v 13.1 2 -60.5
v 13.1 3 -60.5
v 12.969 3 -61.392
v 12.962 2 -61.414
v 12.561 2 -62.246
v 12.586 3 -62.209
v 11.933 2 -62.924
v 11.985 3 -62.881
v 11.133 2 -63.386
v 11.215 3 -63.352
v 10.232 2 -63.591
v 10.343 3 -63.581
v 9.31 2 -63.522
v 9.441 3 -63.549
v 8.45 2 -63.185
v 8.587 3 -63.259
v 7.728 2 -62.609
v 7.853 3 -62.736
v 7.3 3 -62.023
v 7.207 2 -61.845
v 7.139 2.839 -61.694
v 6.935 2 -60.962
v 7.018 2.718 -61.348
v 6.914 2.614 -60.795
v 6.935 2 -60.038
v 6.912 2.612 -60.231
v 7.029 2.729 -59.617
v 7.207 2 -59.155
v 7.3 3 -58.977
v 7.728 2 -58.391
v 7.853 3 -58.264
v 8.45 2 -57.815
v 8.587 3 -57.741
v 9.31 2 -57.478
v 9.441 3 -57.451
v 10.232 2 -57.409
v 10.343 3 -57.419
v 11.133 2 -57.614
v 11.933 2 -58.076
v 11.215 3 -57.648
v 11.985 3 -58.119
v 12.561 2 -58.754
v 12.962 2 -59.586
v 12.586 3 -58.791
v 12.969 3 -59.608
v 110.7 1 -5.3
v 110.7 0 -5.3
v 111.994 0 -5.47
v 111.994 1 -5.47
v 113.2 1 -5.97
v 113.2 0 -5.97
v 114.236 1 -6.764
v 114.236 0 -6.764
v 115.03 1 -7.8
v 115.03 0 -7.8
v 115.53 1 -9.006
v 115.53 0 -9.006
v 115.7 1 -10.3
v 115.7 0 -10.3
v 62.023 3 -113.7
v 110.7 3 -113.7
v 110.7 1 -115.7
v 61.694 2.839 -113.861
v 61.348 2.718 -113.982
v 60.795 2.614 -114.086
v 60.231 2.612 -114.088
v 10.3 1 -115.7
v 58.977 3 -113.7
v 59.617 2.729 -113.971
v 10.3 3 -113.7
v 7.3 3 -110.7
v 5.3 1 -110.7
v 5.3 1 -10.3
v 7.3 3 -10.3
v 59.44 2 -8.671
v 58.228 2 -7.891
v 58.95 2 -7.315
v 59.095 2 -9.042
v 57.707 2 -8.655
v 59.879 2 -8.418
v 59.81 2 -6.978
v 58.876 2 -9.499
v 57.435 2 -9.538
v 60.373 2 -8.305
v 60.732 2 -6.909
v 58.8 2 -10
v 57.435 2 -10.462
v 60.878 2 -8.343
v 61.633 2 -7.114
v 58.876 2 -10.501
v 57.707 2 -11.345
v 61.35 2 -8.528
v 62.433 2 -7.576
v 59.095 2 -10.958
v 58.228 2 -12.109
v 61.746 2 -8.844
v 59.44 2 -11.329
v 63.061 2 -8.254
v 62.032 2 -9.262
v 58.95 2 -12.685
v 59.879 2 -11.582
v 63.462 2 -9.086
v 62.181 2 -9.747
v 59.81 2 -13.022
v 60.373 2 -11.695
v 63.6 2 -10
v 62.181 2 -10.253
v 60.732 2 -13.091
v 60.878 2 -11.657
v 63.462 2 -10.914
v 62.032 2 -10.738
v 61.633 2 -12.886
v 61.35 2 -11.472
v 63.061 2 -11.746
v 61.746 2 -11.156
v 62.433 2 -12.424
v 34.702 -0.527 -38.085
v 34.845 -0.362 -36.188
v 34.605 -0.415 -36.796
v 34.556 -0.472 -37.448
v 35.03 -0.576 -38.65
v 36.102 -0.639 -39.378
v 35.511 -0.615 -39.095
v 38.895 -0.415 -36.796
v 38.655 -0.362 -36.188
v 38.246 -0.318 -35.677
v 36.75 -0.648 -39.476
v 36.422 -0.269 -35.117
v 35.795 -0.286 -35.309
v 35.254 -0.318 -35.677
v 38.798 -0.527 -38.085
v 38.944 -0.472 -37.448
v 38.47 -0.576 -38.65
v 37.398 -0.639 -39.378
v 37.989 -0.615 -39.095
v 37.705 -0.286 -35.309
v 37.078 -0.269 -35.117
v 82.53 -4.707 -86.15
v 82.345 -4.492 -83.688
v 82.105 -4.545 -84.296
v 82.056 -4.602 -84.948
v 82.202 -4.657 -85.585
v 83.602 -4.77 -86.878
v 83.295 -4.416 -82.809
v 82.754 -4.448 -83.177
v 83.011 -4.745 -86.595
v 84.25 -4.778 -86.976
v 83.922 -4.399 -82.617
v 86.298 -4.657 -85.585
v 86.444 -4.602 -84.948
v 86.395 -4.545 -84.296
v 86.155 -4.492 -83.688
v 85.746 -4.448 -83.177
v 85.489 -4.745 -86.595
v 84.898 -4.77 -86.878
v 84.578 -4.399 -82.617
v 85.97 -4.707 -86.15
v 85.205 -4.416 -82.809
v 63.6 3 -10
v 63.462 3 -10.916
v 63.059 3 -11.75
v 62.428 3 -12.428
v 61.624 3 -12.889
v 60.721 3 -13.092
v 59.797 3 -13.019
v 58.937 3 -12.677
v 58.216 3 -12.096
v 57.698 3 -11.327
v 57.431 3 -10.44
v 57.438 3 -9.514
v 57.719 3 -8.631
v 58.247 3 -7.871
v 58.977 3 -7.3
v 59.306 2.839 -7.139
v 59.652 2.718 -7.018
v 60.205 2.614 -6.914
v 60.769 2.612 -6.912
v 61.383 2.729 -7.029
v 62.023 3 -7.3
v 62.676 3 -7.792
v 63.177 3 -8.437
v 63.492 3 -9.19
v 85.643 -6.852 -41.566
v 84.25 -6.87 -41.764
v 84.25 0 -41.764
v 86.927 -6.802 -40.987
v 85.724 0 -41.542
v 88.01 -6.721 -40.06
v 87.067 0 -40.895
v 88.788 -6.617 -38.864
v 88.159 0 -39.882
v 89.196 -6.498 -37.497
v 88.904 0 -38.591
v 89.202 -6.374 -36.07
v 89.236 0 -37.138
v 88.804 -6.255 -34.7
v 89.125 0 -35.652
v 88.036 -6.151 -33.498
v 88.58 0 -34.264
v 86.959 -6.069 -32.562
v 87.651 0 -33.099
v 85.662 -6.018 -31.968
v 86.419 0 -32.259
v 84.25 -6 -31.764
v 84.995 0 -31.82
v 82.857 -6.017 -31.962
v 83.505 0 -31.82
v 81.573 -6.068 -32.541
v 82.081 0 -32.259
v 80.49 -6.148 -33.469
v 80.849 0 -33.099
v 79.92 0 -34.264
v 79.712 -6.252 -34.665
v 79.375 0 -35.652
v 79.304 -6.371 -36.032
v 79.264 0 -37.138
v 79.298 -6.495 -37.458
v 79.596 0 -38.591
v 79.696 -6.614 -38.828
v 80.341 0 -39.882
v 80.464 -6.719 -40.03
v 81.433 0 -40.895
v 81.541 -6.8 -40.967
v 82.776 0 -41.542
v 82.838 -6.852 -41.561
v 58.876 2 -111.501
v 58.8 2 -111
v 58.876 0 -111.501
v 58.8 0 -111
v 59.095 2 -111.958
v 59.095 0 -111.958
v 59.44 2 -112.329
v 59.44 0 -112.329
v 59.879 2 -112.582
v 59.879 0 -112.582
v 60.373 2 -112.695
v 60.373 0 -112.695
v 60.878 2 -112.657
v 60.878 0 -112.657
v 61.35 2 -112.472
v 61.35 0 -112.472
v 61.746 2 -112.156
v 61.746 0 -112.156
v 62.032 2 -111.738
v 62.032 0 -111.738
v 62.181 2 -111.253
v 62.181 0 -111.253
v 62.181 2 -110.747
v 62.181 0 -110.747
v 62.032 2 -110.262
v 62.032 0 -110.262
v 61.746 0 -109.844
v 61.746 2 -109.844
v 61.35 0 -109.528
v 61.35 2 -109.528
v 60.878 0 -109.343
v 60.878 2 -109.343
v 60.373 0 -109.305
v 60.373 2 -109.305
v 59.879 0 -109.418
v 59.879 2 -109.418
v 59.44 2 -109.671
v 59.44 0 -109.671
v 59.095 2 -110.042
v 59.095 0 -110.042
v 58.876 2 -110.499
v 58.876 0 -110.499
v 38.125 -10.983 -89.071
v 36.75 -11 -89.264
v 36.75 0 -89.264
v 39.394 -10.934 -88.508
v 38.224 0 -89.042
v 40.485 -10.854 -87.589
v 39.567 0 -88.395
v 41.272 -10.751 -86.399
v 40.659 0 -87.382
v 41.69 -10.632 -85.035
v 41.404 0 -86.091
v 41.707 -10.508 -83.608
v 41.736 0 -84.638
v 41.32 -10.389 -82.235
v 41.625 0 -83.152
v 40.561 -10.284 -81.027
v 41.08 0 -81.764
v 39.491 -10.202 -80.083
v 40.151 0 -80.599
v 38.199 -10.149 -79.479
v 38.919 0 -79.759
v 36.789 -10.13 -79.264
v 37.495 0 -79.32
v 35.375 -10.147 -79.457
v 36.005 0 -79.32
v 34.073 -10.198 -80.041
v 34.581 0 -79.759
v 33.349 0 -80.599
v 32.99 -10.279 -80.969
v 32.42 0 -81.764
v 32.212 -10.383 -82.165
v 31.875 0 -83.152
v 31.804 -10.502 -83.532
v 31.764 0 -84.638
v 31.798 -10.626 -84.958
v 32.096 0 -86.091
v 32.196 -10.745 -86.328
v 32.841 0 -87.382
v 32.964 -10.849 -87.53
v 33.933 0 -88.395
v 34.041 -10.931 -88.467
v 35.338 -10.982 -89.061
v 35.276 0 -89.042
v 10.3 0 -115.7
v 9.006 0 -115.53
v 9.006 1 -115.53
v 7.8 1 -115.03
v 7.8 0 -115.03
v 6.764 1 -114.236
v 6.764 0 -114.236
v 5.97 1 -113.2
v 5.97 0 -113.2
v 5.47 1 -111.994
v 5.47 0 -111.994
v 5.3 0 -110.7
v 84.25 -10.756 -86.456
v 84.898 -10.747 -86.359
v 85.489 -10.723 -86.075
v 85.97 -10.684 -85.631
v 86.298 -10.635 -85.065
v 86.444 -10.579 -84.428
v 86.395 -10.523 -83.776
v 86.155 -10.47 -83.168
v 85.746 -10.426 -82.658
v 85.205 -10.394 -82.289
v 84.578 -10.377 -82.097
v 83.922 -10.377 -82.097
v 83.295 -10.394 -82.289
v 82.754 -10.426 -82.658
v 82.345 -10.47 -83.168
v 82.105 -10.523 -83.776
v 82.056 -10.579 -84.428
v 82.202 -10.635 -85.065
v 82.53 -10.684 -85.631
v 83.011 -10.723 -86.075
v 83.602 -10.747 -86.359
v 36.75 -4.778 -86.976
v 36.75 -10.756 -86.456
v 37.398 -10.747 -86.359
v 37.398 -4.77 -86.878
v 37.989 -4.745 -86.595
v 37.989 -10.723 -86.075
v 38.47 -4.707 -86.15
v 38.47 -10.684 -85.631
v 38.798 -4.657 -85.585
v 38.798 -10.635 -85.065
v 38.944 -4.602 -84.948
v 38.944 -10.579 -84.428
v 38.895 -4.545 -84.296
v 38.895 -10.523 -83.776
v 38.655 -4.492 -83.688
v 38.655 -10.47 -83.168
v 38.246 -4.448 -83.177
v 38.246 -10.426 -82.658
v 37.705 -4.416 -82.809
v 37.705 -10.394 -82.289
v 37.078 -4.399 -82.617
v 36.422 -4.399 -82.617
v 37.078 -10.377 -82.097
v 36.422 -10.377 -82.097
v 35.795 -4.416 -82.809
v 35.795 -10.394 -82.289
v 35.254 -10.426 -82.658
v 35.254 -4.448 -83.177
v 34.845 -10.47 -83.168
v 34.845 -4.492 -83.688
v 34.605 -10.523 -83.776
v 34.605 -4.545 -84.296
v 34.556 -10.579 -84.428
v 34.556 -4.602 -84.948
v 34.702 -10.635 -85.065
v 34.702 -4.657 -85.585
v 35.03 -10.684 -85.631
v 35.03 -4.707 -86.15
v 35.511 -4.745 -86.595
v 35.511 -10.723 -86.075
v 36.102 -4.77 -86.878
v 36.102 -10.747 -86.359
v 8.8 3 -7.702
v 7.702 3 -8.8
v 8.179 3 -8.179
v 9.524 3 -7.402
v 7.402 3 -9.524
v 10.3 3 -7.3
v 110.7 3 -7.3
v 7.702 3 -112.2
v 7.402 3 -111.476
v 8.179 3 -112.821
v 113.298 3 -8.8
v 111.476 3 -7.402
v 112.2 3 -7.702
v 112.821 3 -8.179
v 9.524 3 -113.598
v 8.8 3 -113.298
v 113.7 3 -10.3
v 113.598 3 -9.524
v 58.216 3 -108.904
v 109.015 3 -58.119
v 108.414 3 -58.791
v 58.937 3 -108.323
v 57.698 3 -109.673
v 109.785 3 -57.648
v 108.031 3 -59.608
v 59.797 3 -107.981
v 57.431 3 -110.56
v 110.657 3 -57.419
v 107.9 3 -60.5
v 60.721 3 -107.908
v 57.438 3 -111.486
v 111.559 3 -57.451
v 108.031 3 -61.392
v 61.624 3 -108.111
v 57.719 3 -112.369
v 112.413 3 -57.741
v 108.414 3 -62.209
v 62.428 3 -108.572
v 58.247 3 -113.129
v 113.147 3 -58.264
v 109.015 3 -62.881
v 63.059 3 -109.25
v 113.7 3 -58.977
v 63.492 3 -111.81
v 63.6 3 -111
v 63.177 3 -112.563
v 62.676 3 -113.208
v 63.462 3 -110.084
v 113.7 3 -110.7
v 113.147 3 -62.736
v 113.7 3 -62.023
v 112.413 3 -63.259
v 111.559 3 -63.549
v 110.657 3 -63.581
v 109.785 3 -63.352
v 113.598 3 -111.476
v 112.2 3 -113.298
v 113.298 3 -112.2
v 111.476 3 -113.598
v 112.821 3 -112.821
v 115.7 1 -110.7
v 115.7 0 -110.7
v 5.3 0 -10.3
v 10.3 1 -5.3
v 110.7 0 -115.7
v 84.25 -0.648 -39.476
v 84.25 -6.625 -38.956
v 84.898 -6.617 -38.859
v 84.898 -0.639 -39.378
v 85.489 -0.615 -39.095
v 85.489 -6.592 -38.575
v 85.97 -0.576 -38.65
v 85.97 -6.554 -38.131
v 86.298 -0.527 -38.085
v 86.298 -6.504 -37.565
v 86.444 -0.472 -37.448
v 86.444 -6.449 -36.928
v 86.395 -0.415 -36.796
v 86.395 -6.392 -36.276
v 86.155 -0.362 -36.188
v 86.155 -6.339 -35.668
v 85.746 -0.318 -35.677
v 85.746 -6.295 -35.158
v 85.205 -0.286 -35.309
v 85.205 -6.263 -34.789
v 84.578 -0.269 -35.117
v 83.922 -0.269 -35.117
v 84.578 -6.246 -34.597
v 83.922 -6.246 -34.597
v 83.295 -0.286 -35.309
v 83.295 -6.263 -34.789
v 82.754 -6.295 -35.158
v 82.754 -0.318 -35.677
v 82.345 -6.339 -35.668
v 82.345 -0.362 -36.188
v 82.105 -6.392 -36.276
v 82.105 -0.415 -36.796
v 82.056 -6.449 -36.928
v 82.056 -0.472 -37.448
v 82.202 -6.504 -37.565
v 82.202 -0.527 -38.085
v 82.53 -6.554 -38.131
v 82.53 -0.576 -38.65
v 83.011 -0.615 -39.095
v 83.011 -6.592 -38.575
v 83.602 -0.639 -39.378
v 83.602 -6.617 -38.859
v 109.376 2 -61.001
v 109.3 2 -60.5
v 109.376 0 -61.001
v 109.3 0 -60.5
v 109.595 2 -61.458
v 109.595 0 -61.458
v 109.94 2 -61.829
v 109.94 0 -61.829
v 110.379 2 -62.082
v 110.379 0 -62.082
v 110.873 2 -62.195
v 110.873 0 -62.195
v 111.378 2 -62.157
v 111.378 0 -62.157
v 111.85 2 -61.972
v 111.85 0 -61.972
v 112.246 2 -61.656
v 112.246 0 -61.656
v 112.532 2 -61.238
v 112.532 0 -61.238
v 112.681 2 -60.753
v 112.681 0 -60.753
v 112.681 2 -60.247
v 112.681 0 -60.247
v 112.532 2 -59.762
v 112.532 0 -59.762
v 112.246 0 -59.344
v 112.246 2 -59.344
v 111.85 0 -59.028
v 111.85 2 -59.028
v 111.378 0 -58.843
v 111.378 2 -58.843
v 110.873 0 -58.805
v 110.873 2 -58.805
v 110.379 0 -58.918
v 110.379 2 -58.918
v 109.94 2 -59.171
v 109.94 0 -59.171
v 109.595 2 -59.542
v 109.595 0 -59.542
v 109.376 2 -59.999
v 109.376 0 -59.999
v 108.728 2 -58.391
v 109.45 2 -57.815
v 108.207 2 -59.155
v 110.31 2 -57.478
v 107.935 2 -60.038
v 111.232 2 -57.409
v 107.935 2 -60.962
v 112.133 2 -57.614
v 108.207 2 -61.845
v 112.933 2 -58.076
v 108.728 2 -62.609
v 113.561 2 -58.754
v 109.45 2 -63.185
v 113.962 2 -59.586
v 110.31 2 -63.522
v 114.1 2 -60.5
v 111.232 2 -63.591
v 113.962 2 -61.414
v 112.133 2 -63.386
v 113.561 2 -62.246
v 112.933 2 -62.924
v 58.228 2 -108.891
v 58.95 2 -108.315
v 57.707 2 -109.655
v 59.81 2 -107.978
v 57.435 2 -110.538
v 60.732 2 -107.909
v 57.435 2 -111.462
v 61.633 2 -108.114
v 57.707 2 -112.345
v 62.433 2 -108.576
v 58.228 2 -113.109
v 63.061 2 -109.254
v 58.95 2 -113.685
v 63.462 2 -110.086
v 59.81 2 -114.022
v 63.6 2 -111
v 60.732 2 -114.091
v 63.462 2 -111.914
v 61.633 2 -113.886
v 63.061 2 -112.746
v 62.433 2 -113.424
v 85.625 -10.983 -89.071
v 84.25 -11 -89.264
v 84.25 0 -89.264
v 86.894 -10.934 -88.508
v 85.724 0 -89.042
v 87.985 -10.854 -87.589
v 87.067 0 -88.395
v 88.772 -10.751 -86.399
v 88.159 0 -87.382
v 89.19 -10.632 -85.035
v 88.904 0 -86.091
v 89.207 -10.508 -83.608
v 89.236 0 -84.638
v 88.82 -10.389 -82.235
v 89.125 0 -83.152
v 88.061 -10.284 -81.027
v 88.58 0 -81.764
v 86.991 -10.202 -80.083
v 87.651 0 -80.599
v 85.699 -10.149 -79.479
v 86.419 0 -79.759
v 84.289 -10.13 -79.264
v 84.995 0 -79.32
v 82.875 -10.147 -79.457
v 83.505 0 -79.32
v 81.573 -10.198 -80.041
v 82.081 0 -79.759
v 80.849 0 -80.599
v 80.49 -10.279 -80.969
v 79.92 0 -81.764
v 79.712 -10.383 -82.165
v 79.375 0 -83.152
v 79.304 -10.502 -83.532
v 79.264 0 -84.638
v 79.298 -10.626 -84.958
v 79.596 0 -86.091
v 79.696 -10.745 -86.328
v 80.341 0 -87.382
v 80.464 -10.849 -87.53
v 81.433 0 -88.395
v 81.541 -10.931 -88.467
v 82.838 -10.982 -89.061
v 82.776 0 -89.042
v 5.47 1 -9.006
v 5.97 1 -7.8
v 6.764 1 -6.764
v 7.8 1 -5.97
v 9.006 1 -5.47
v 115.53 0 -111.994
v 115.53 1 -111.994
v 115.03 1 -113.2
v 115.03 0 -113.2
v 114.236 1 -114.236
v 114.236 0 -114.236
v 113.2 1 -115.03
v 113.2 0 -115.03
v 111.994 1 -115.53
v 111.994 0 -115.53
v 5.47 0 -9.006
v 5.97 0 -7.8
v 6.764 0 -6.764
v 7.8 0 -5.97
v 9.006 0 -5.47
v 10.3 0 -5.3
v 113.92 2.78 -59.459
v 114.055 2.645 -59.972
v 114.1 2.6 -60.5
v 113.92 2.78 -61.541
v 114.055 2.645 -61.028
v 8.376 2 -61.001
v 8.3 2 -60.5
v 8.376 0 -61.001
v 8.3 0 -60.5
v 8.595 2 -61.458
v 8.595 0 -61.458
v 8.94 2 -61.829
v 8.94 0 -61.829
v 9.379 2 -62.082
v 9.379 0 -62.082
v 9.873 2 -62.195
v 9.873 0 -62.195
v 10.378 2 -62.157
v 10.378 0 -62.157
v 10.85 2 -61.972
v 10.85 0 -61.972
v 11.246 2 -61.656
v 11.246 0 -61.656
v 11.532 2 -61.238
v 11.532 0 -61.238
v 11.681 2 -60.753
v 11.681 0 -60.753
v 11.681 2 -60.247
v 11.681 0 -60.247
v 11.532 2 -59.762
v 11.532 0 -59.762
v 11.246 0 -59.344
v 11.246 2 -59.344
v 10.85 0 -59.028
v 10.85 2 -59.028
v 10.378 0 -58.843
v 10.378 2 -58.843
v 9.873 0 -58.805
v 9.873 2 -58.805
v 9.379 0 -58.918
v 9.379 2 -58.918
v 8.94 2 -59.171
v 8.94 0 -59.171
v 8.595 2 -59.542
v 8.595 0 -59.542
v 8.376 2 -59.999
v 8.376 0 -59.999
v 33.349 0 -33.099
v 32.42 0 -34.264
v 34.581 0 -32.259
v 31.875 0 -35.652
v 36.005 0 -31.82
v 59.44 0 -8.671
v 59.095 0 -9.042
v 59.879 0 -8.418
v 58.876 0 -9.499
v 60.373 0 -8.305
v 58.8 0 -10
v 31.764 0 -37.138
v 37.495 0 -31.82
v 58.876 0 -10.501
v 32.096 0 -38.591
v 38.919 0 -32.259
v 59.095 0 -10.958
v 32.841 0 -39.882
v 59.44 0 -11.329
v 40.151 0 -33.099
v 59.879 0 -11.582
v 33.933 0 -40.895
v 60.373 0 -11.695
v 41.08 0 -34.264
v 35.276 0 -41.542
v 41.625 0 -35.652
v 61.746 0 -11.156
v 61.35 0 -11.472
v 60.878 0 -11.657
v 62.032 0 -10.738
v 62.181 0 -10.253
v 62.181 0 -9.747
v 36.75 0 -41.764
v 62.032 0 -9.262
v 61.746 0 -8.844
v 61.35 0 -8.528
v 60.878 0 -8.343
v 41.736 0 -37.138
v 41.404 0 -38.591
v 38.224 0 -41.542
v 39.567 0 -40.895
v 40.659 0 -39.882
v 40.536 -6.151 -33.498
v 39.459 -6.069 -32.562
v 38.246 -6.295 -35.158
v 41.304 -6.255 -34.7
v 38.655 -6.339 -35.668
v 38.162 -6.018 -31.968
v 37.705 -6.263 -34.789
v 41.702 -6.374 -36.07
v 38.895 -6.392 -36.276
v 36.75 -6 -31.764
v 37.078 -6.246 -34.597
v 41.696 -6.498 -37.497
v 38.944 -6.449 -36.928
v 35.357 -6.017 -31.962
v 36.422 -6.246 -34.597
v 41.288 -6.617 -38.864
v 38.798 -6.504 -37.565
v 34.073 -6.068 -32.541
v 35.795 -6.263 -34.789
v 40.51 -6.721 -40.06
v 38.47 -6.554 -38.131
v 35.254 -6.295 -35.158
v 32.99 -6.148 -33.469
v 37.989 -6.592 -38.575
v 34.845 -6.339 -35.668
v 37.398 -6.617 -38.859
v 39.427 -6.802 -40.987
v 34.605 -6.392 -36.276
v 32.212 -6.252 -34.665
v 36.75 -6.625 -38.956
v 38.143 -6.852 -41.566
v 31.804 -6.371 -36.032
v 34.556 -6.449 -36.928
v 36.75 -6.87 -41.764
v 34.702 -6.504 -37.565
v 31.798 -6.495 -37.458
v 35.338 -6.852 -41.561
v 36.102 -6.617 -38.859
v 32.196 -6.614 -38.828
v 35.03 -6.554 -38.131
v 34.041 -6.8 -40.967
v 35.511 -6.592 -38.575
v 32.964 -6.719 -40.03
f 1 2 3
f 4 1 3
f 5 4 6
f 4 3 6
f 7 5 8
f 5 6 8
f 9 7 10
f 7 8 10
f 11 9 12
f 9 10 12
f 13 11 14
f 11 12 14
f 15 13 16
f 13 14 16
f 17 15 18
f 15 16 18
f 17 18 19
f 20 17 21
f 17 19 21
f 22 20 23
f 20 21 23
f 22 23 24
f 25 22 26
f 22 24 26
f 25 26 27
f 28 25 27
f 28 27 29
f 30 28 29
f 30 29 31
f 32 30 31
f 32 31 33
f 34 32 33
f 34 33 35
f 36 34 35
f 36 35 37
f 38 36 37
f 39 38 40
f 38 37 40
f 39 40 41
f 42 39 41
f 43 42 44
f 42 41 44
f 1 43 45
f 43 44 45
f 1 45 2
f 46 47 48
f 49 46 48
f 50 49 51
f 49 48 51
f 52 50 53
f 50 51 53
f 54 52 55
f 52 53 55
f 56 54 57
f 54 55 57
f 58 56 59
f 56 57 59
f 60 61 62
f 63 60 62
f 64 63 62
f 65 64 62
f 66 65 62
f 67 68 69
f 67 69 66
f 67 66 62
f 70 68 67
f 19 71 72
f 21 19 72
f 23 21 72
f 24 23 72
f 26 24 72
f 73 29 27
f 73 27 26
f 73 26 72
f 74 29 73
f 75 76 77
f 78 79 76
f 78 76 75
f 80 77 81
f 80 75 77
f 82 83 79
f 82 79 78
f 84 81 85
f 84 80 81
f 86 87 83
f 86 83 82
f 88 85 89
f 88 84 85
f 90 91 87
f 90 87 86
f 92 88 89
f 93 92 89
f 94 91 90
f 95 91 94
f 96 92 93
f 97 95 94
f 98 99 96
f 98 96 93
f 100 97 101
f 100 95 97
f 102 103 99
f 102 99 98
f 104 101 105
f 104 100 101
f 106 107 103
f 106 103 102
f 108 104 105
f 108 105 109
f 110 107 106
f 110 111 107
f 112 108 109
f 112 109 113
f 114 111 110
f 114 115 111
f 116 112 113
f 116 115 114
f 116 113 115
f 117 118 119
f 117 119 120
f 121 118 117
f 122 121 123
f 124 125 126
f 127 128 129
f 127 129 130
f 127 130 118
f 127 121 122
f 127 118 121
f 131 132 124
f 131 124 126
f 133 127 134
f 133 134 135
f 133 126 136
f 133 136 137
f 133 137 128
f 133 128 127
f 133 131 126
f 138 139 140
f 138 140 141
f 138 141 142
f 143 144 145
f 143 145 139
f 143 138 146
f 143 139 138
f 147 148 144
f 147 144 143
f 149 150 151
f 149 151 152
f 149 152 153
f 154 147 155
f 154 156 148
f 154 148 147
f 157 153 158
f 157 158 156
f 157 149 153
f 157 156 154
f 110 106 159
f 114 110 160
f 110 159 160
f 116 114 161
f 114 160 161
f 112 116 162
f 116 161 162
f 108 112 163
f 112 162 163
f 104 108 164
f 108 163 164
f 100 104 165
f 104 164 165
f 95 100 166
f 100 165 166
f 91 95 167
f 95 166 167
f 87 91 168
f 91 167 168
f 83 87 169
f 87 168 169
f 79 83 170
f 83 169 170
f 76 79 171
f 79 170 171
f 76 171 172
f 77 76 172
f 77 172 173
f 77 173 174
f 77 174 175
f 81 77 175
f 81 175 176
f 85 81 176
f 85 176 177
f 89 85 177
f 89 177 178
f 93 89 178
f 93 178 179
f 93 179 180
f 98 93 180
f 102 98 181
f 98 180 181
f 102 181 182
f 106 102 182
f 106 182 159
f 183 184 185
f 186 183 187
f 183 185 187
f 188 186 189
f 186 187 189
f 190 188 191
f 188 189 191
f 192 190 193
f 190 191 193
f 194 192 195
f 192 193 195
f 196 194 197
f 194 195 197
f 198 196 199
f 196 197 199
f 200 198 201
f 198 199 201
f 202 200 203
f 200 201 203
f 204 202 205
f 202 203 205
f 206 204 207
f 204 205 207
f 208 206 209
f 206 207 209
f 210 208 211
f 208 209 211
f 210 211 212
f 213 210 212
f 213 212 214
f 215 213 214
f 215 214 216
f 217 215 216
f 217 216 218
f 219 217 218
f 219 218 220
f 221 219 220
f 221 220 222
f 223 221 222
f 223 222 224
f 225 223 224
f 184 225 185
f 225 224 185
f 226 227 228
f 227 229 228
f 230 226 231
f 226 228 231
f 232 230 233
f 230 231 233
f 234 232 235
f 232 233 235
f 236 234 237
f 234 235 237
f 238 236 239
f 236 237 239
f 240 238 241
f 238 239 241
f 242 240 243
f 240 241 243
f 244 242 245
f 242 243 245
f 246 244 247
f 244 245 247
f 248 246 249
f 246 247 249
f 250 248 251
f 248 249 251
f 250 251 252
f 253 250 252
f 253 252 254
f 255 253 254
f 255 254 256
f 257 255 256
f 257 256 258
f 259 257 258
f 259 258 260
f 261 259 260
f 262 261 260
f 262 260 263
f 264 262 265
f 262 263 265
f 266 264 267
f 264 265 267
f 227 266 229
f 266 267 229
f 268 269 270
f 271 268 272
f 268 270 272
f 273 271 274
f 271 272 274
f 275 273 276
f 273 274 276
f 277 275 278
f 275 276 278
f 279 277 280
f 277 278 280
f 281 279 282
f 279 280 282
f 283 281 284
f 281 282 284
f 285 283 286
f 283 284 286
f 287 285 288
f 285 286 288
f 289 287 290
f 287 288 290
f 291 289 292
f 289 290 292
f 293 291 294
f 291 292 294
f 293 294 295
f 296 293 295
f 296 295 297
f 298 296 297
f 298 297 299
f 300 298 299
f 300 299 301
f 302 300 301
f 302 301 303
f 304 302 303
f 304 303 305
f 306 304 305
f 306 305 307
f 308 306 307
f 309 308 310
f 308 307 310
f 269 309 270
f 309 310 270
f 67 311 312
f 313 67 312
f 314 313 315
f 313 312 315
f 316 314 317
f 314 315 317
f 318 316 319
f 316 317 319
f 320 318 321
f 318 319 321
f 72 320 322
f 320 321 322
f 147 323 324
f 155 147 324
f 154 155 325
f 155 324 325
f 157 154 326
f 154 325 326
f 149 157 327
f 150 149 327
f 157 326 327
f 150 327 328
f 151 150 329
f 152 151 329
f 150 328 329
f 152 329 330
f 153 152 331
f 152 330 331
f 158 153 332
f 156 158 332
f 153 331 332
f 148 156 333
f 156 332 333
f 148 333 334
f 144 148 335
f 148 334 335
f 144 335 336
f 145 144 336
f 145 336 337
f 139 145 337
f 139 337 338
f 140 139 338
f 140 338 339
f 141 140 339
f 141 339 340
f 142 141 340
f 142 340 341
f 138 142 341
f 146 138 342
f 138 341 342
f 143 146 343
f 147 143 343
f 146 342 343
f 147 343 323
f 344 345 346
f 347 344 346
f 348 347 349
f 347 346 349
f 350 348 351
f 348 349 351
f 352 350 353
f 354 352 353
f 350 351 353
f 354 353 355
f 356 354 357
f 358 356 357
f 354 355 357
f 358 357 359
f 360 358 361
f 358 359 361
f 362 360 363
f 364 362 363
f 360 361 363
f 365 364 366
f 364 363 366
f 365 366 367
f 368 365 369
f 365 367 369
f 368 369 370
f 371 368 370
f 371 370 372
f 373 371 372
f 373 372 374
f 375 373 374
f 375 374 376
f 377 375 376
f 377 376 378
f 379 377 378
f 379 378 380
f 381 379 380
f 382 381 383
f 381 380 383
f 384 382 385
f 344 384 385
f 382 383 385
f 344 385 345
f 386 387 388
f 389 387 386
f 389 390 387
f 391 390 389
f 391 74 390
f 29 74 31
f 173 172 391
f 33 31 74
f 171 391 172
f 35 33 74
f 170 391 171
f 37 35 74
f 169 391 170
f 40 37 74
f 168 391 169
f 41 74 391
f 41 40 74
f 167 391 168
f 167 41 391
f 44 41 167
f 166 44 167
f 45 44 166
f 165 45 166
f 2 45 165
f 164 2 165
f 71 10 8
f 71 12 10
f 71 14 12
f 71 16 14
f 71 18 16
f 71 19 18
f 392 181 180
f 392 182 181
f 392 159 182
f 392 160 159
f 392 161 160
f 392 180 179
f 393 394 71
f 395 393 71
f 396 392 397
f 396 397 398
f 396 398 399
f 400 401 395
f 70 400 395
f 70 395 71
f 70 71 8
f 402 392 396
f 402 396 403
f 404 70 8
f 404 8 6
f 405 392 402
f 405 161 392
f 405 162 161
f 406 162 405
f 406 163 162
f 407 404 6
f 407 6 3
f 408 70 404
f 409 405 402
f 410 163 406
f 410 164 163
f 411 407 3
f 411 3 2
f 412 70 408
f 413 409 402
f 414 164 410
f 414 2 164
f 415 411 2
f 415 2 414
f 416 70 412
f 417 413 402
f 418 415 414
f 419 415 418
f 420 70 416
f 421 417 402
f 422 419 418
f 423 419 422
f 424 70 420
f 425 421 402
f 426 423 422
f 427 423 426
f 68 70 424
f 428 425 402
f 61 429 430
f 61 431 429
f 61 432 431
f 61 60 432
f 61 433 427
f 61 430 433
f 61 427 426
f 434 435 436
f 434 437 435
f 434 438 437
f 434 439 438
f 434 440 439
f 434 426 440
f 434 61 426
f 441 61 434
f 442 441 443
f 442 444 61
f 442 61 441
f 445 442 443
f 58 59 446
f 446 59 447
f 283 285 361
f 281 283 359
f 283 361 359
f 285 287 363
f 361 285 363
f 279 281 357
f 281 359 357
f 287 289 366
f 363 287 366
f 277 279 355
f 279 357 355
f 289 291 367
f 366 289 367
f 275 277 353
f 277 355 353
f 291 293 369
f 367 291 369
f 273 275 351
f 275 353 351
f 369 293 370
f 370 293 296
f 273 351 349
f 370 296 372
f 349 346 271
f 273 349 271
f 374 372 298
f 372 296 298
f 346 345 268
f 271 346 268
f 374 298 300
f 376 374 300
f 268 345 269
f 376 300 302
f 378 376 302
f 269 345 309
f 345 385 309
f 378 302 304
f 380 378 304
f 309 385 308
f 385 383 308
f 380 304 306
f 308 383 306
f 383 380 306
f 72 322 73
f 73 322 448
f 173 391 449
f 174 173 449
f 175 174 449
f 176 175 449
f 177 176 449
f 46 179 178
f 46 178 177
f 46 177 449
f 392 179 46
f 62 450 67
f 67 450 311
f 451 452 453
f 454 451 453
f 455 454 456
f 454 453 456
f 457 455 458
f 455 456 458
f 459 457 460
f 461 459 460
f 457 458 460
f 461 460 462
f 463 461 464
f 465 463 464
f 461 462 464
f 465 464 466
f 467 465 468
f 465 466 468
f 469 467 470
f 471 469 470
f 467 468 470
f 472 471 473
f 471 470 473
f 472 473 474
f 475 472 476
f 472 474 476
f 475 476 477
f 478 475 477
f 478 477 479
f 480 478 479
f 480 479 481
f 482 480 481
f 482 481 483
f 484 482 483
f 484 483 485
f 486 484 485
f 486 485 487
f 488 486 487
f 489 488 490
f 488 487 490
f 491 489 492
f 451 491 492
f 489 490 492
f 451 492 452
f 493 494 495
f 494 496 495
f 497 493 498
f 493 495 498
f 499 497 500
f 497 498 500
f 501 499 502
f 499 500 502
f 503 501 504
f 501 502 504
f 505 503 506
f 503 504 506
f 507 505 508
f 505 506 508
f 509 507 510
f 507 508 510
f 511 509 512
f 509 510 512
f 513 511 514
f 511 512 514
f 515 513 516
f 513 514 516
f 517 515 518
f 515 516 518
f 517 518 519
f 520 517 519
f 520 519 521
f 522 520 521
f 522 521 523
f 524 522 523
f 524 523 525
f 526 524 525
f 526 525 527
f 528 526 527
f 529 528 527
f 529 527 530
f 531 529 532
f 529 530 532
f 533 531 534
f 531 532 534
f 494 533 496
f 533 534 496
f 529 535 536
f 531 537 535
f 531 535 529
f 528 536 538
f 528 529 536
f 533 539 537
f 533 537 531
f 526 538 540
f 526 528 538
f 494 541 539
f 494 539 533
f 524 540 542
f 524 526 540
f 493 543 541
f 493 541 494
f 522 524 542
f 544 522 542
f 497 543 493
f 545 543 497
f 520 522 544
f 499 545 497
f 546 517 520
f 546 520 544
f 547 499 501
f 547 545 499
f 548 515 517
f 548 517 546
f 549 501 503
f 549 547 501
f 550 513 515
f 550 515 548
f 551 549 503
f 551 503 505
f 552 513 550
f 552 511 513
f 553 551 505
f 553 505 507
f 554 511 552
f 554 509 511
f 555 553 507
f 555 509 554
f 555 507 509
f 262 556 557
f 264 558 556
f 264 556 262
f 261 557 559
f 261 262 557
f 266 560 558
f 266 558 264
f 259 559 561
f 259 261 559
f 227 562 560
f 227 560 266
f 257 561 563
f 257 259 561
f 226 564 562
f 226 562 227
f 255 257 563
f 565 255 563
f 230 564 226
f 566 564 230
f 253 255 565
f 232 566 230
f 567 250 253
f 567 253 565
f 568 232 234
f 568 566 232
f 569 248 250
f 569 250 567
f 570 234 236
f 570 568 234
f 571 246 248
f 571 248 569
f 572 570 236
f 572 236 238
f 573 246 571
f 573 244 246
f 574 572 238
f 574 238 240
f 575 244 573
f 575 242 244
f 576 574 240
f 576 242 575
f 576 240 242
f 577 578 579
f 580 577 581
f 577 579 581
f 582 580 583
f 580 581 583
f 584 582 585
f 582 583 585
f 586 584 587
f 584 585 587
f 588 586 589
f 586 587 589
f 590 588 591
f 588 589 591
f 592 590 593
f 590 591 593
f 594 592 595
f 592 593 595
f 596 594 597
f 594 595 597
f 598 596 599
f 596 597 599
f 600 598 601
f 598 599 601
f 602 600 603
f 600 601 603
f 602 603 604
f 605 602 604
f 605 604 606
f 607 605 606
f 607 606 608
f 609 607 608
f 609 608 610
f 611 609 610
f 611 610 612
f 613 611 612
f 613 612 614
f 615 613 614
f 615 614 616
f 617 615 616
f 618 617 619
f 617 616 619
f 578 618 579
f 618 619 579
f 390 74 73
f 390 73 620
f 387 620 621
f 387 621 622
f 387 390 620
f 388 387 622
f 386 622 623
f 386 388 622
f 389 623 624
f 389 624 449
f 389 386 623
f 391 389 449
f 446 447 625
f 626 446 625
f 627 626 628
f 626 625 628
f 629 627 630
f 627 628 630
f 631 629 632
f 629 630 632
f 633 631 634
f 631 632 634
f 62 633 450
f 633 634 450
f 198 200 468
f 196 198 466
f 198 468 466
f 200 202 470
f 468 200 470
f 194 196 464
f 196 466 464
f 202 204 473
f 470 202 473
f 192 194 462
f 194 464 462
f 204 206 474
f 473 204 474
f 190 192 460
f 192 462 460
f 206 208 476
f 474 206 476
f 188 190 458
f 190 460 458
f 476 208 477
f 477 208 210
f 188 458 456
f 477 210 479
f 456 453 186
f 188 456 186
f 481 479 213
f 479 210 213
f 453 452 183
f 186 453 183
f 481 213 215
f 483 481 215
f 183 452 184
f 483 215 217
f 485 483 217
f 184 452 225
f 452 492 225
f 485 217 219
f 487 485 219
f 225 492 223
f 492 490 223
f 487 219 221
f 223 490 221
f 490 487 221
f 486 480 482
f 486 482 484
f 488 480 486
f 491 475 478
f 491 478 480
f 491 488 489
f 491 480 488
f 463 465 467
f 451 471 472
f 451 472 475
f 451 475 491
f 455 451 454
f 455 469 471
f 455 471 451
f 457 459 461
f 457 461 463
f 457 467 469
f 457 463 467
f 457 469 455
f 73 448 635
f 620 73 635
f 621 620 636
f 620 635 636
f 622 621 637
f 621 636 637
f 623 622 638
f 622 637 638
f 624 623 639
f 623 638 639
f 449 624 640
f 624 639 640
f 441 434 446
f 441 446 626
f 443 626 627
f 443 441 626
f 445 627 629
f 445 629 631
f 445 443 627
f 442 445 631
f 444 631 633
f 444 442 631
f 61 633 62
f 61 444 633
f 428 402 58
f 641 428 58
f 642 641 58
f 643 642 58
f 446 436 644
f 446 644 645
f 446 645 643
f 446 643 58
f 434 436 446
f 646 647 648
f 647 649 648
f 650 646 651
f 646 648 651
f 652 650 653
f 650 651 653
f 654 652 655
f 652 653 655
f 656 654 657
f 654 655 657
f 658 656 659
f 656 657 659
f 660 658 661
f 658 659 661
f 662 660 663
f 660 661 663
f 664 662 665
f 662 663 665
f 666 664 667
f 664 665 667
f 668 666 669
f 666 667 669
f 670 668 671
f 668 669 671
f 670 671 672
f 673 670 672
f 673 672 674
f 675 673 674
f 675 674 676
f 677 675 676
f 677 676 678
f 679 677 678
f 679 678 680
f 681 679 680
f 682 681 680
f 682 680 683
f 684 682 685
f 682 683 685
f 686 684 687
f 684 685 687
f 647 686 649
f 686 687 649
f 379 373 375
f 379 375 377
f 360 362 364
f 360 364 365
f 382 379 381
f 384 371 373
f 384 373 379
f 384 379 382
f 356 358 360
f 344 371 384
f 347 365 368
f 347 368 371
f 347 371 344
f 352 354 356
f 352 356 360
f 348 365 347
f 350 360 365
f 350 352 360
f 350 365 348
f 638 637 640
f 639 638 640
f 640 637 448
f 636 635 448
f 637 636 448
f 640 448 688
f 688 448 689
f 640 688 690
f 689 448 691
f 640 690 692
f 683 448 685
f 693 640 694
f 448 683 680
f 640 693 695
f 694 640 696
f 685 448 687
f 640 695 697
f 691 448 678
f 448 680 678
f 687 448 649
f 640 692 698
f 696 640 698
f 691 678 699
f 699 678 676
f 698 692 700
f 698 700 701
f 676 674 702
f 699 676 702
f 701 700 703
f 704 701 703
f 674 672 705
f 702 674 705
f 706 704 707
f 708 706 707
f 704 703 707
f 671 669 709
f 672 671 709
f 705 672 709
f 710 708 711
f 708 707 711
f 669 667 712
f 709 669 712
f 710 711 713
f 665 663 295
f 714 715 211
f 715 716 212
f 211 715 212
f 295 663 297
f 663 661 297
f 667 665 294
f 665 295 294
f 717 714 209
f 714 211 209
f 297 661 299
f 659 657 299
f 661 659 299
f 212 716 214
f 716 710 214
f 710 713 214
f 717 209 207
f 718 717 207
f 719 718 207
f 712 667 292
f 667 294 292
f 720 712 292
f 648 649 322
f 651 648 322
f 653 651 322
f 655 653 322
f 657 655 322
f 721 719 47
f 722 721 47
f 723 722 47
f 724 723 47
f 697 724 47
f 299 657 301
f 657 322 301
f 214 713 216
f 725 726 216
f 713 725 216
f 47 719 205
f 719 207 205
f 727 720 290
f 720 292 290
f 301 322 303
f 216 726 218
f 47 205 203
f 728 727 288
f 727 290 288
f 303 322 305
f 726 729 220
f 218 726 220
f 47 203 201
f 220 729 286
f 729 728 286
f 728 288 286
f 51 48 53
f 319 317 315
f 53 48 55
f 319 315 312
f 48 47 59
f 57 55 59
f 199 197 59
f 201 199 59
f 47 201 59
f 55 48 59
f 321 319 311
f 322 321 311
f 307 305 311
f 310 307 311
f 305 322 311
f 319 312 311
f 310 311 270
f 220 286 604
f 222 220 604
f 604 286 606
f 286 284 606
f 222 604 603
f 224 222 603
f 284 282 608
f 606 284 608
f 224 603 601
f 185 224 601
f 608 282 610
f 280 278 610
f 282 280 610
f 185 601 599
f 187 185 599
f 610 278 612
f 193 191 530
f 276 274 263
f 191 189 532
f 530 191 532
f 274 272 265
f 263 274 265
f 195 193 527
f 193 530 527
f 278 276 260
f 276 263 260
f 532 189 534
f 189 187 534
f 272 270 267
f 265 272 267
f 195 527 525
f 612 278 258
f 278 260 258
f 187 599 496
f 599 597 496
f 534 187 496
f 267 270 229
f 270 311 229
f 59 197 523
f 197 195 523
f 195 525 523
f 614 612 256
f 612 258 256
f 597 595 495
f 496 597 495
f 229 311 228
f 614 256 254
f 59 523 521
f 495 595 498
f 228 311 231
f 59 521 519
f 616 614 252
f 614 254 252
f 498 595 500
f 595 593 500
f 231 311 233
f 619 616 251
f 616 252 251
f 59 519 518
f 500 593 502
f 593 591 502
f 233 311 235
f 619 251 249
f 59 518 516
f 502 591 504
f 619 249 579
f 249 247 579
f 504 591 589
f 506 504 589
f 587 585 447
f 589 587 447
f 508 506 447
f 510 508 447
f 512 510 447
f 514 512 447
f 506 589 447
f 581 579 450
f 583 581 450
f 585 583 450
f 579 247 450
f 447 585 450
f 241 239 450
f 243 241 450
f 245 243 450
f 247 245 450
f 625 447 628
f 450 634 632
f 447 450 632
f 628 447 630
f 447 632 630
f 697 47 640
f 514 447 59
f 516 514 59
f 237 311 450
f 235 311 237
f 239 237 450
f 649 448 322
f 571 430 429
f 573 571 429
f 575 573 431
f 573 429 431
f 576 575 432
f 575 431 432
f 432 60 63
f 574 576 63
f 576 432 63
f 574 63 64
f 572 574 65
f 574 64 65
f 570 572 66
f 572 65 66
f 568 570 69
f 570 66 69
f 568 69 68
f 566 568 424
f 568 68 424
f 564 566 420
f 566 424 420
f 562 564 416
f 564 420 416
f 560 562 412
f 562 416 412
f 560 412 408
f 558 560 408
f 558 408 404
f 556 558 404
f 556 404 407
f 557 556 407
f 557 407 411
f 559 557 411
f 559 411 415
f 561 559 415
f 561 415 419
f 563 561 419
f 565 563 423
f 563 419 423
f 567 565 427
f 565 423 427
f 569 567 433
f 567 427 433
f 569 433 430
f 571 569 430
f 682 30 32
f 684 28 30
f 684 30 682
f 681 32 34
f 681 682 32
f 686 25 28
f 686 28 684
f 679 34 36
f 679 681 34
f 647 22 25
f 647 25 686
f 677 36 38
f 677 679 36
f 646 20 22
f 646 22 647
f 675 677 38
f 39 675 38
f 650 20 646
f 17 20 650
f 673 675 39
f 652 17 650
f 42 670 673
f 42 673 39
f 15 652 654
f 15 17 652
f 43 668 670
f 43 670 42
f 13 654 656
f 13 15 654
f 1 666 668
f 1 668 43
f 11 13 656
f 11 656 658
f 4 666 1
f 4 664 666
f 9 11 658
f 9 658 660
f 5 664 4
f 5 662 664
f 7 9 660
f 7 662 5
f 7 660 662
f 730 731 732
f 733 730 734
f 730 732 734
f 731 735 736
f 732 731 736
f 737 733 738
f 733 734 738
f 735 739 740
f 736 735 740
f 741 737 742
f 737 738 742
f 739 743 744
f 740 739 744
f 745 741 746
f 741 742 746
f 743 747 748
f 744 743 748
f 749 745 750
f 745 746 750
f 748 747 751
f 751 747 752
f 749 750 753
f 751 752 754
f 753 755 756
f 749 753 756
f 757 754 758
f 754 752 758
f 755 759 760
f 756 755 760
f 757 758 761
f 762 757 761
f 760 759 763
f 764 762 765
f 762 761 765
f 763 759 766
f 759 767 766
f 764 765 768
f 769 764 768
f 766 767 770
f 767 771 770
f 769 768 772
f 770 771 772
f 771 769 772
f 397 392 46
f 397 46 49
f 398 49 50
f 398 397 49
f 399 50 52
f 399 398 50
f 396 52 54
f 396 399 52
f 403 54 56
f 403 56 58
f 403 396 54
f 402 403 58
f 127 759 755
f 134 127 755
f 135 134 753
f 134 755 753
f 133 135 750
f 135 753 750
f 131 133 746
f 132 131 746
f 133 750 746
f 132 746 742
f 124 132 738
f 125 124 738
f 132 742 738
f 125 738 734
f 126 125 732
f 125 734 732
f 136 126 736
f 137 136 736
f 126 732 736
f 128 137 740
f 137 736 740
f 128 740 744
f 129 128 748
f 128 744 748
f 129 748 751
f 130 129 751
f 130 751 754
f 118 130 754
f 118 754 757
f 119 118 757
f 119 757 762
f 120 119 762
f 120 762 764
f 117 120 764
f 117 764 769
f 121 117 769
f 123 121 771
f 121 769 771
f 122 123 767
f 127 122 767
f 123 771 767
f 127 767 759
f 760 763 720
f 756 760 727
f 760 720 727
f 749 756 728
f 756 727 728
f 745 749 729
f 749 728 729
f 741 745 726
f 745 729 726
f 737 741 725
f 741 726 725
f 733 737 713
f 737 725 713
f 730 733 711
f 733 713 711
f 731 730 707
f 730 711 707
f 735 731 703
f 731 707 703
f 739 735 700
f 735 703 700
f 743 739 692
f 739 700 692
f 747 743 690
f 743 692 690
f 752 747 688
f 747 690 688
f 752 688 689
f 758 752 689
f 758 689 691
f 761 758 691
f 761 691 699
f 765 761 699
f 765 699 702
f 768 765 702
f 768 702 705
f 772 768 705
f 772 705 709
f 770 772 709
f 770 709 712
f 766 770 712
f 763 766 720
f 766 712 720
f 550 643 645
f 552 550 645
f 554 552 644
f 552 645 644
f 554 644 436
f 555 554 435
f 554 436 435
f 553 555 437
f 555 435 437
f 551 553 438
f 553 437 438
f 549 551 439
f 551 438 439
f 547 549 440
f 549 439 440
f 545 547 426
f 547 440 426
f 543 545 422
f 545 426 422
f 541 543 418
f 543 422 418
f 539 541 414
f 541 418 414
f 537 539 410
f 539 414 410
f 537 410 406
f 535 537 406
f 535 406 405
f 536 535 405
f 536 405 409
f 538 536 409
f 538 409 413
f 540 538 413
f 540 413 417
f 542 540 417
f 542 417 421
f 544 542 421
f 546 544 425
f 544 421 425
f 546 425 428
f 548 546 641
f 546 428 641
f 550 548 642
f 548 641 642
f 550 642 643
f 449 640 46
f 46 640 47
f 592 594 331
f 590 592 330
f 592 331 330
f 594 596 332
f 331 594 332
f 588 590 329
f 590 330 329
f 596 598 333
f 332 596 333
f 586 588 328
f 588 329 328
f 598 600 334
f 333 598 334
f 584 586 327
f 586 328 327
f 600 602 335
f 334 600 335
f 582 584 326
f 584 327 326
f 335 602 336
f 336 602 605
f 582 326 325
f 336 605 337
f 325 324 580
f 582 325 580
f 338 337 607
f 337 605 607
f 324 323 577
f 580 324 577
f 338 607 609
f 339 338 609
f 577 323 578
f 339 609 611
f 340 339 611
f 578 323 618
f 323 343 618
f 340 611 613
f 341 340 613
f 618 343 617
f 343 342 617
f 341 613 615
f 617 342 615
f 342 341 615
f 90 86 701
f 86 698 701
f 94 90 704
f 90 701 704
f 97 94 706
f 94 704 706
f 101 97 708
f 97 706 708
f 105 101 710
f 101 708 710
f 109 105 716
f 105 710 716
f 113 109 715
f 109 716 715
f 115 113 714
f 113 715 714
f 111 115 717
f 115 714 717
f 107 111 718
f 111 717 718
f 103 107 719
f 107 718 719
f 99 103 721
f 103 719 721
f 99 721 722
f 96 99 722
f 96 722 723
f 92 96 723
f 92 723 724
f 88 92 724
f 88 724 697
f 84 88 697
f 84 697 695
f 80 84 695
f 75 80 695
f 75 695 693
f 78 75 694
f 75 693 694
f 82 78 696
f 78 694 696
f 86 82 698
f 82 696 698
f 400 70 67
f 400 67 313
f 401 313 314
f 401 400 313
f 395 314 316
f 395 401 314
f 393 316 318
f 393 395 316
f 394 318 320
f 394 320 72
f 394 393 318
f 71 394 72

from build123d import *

# Parameters (mm, degrees)
BOSS_EXTRUDE1_DEPTH                                  = 3
CHAMFER1_SIZE                                        = 2
CBORE_FOR_M3_CROSS_RECESS_PAN_HEAD_SCREW_D           = 3.4
CBORE_FOR_M3_CROSS_RECESS_PAN_HEAD_SCREW_DEPTH       = 5
CBORE_FOR_M3_CROSS_RECESS_PAN_HEAD_SCREW_CBORE_D     = 6.2
CBORE_FOR_M3_CROSS_RECESS_PAN_HEAD_SCREW_CBORE_DEPTH = 1
CBORE_FOR_M3_CROSS_RECESS_PAN_HEAD_SCREW_TIP         = 1.021463052
SKETCH10_R                                           = 5
BOSS_EXTRUDE4_DEPTH                                  = 11
CUT_EXTRUDE4_REACH                                   = 165.994
SKETCH12_R                                           = 2.2
CUT_EXTRUDE5_DEPTH                                   = 6


with BuildPart() as part:
    # Sketch1 → Boss-Extrude1 (new body)
    with BuildSketch(Plane(origin=(0, 0, 0), x_dir=(1, 0, 0), z_dir=(0, 1, 0))):
        with BuildLine():
            Line((10.3, 5.3), (110.7, 5.3))
            ThreePointArc((110.7, 5.3), (114.235533906, 6.764466094), (115.7, 10.3))
            Line((115.7, 10.3), (115.7, 110.7))
            ThreePointArc((115.7, 110.7), (114.235533906, 114.235533906), (110.7, 115.7))
            Line((110.7, 115.7), (10.3, 115.7))
            ThreePointArc((10.3, 115.7), (6.764466094, 114.235533906), (5.3, 110.7))
            Line((5.3, 110.7), (5.3, 10.3))
            ThreePointArc((5.3, 10.3), (6.764466094, 6.764466094), (10.3, 5.3))
        make_face()
    extrude(amount=BOSS_EXTRUDE1_DEPTH)

    # Chamfer1
    chamfer1_edges = [part.edges().sort_by_distance(p)[0] for p in [
        (115.7, 3, -60.5),
        (114.235533906, 3, -6.764466094),
        (60.5, 3, -5.3),
        (6.764466094, 3, -6.764466094),
        (5.3, 3, -60.5),
        (6.764466094, 3, -114.235533906),
        (60.5, 3, -115.7),
        (114.235533906, 3, -114.235533906),
    ]]
    chamfer(chamfer1_edges, length=CHAMFER1_SIZE)

    # CBORE for M3 Cross Recess Pan Head Screw1
    with Locations(Plane(origin=(0, 3, 0), x_dir=(1, 0, 0), z_dir=(0, 1, 0))):
        with Locations((60.5, 111), (10, 60.5), (60.5, 10), (111, 60.5)):
            CounterBoreHole(CBORE_FOR_M3_CROSS_RECESS_PAN_HEAD_SCREW_D / 2, CBORE_FOR_M3_CROSS_RECESS_PAN_HEAD_SCREW_CBORE_D / 2, CBORE_FOR_M3_CROSS_RECESS_PAN_HEAD_SCREW_CBORE_DEPTH, depth=CBORE_FOR_M3_CROSS_RECESS_PAN_HEAD_SCREW_DEPTH)
            with Locations((0, 0, -(CBORE_FOR_M3_CROSS_RECESS_PAN_HEAD_SCREW_DEPTH + CBORE_FOR_M3_CROSS_RECESS_PAN_HEAD_SCREW_TIP / 2))):  # 118° drill point
                Cone(0, CBORE_FOR_M3_CROSS_RECESS_PAN_HEAD_SCREW_D / 2, CBORE_FOR_M3_CROSS_RECESS_PAN_HEAD_SCREW_TIP, mode=Mode.SUBTRACT)

    # Sketch10 → Boss-Extrude4 (add)
    with BuildSketch(Plane.XZ):
        with Locations(Location((36.75, -36.764162159, 0), (0, 0, 270))):
            Circle(SKETCH10_R)
        with Locations(Location((36.75, -84.264162159, 0), (0, 0, 270))):
            Circle(SKETCH10_R)
        with Locations(Location((84.25, -84.264162159, 0), (0, 0, 270))):
            Circle(SKETCH10_R)
        with Locations(Location((84.25, -36.764162159, 0), (0, 0, 270))):
            Circle(SKETCH10_R)
    extrude(amount=BOSS_EXTRUDE4_DEPTH)

    # Cut-Extrude4: up to this face of the body (flat: up to its plane)
    cut_extrude4_end = Plane(part.part.faces().sort_by_distance((115.7, 0.5, -60.5))[0])
    # Sketch11 → Cut-Extrude4 (cut, up to the picked face)
    with BuildSketch(Plane(origin=(0, 0, 0), x_dir=(0, 0, -1), z_dir=(1, 0, 0)), mode=Mode.PRIVATE) as cut_extrude4_sk1:
        Polygon((31.764162159, -11), (31.764162159, -6), (89.264162159, -11), align=None)
    cut_extrude4_tool1 = split(extrude(cut_extrude4_sk1.sketch, amount=CUT_EXTRUDE4_REACH, mode=Mode.PRIVATE), bisect_by=cut_extrude4_end, keep=Keep.BOTH, mode=Mode.PRIVATE)
    add(cut_extrude4_tool1.solids().sort_by(Axis((0, -9.333333, -50.930829), (1, 0, 0)))[0], mode=Mode.SUBTRACT)

    # Sketch12 → Cut-Extrude5 (cut)
    with BuildSketch(Plane(origin=(0, -3.213599513, 0.279443436), x_dir=(1, 0, 0), z_dir=(0, -0.9962405881956831, 0.08662961636484202))):
        with Locations(Location((84.25, -84.862639202, 0), (0, 0, 270))):
            Circle(SKETCH12_R)
        with Locations(Location((36.75, -84.862639202, 0), (0, 0, 270))):
            Circle(SKETCH12_R)
        with Locations(Location((36.75, -37.183393282, 0), (0, 0, 270))):
            Circle(SKETCH12_R)
        with Locations(Location((84.25, -37.183393282, 0), (0, 0, 270))):
            Circle(SKETCH12_R)
    extrude(amount=-CUT_EXTRUDE5_DEPTH, mode=Mode.SUBTRACT)


solid = part.part
